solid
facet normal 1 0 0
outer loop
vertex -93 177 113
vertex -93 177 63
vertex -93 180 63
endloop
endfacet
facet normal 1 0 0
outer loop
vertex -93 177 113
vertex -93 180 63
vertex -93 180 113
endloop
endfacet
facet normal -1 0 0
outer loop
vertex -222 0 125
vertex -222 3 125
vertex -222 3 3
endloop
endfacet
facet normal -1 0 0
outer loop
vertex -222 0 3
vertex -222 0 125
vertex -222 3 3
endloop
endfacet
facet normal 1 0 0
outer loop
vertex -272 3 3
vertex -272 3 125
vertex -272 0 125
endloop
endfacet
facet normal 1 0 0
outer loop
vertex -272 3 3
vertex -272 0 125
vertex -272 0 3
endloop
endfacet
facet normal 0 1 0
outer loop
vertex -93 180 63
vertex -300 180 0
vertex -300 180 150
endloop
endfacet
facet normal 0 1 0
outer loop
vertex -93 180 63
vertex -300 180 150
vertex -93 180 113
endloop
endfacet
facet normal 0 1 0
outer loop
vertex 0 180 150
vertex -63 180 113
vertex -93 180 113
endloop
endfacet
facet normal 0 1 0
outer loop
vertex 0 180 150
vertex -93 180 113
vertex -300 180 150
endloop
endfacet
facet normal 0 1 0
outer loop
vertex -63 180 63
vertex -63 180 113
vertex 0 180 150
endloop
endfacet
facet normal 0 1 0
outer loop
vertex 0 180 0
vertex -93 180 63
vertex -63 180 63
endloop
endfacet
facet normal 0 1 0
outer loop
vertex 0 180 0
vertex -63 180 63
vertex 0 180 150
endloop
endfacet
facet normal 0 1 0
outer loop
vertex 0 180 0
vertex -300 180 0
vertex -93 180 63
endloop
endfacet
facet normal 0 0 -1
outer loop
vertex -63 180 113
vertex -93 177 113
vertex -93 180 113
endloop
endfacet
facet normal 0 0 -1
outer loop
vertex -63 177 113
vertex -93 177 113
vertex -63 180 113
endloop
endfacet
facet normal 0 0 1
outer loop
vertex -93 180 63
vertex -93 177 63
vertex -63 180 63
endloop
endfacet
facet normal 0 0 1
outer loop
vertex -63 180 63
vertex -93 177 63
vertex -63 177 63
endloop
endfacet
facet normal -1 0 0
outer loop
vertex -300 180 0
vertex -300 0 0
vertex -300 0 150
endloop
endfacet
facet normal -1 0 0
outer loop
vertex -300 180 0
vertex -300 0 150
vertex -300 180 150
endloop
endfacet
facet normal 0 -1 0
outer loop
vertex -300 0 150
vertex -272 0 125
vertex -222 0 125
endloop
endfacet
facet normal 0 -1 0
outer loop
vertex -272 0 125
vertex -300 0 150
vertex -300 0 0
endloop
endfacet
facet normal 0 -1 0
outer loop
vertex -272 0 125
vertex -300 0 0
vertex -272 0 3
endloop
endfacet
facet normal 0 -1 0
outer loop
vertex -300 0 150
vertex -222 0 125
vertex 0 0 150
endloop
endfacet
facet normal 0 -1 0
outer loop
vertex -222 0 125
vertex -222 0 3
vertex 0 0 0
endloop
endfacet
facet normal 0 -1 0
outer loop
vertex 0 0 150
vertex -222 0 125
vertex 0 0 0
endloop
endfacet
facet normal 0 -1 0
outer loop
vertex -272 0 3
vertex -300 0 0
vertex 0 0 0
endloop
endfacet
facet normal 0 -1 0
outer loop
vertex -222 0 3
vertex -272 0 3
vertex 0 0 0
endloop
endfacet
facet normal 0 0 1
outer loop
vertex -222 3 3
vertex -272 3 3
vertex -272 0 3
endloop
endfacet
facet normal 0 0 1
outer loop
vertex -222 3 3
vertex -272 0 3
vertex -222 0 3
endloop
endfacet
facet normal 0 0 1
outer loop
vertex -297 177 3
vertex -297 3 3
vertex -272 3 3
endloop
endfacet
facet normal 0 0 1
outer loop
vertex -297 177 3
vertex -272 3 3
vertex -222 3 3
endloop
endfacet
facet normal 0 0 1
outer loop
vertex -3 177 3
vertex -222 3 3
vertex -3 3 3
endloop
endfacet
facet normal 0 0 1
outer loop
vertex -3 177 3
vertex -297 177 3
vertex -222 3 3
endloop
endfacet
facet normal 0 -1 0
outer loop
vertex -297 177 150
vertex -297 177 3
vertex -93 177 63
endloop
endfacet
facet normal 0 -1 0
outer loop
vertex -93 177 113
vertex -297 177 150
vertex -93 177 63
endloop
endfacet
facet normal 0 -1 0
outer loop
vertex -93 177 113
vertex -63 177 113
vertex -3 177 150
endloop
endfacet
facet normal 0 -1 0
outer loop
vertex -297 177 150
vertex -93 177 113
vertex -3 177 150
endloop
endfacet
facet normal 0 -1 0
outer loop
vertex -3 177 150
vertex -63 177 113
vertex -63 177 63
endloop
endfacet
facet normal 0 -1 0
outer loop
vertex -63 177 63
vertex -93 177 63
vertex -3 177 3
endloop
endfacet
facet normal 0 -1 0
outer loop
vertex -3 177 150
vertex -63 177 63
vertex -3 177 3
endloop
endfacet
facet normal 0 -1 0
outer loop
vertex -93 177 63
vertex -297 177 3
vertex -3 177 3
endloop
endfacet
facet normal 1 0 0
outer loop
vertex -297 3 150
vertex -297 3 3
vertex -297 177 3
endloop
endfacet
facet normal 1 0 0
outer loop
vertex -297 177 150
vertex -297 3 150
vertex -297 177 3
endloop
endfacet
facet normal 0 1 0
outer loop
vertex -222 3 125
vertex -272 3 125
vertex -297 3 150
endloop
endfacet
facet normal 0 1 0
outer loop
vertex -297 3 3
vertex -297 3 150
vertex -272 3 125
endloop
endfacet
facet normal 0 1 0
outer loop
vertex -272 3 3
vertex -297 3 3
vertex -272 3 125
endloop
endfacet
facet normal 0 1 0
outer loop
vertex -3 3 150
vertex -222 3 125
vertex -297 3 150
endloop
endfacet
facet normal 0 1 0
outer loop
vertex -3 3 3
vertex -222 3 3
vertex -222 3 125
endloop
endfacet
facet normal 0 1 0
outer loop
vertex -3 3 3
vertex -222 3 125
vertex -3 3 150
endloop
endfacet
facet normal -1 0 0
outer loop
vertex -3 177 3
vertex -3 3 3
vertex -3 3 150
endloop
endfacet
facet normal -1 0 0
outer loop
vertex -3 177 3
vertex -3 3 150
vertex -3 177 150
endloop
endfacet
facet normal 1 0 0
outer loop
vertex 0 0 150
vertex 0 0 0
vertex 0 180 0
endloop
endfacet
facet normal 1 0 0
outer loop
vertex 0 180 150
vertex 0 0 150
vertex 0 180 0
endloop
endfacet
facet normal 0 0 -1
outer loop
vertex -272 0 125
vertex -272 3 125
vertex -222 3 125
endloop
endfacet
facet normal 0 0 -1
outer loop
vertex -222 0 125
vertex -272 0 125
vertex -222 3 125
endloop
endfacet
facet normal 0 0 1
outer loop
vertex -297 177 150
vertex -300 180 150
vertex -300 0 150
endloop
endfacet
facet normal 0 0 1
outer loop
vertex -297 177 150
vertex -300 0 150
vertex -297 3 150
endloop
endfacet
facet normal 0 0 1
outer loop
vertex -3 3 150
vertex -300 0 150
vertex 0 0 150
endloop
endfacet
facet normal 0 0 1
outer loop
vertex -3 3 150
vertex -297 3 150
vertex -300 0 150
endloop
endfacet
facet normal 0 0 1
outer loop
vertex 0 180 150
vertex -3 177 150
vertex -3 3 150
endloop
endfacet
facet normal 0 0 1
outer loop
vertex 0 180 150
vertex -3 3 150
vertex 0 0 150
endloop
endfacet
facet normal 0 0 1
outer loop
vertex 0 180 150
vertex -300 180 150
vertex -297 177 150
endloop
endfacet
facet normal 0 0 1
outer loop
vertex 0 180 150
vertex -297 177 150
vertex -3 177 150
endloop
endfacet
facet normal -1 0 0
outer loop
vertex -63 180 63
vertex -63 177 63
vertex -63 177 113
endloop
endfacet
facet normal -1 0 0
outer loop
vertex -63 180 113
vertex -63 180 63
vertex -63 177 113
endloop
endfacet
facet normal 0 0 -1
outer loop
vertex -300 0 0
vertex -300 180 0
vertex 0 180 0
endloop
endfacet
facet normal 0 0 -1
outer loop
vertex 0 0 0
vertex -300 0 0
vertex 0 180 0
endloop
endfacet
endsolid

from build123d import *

# Parameters (mm, degrees)
ESQUISSE1_W             = 300
ESQUISSE1_H             = 180
BOSS_EXTRU_1_DEPTH      = 150
COQUE1_T                = -3
ENL_V_MAT_EXTRU_1_REACH = 5
ESQUISSE2_W             = 50
ESQUISSE2_H             = 122
ENL_V_MAT_EXTRU_2_REACH = 5
ESQUISSE3_W             = 30
ESQUISSE3_H             = 50


with BuildPart() as part:
    # Esquisse1 → Boss.-Extru.1 (new body)
    with BuildSketch(Plane.XY):
        with Locations((-150, 90)):
            Rectangle(ESQUISSE1_W, ESQUISSE1_H)
    extrude(amount=BOSS_EXTRU_1_DEPTH)

    # Coque1
    coque1_openings = [part.faces().sort_by_distance(p)[0] for p in [
        (-150, 90, 150),
    ]]
    offset(amount=COQUE1_T, openings=coque1_openings, kind=Kind.INTERSECTION)

    # Esquisse2 → Enlèv. mat.-Extru.1 (cut, up to next)
    with BuildSketch(Plane(origin=(0, 3, 0), x_dir=(1, 0, 0), z_dir=(0, 1, 0)), mode=Mode.PRIVATE) as enl_v_mat_extru_1_sk1:
        with Locations((-247, -64)):
            Rectangle(ESQUISSE2_W, ESQUISSE2_H)
    enl_v_mat_extru_1_tool1 = extrude(enl_v_mat_extru_1_sk1.sketch, amount=-ENL_V_MAT_EXTRU_1_REACH, mode=Mode.PRIVATE) & part.part
    add(enl_v_mat_extru_1_tool1.solids().sort_by_distance((-247, 3, 64))[0], mode=Mode.SUBTRACT)

    # Esquisse3 → Enlèv. mat.-Extru.2 (cut, up to next)
    with BuildSketch(Plane.XZ.offset(-177), mode=Mode.PRIVATE) as enl_v_mat_extru_2_sk1:
        with Locations((-78, 88)):
            Rectangle(ESQUISSE3_W, ESQUISSE3_H)
    enl_v_mat_extru_2_tool1 = extrude(enl_v_mat_extru_2_sk1.sketch, amount=-ENL_V_MAT_EXTRU_2_REACH, mode=Mode.PRIVATE) & part.part
    add(enl_v_mat_extru_2_tool1.solids().sort_by_distance((-78, 177, 88))[0], mode=Mode.SUBTRACT)


solid = part.part
